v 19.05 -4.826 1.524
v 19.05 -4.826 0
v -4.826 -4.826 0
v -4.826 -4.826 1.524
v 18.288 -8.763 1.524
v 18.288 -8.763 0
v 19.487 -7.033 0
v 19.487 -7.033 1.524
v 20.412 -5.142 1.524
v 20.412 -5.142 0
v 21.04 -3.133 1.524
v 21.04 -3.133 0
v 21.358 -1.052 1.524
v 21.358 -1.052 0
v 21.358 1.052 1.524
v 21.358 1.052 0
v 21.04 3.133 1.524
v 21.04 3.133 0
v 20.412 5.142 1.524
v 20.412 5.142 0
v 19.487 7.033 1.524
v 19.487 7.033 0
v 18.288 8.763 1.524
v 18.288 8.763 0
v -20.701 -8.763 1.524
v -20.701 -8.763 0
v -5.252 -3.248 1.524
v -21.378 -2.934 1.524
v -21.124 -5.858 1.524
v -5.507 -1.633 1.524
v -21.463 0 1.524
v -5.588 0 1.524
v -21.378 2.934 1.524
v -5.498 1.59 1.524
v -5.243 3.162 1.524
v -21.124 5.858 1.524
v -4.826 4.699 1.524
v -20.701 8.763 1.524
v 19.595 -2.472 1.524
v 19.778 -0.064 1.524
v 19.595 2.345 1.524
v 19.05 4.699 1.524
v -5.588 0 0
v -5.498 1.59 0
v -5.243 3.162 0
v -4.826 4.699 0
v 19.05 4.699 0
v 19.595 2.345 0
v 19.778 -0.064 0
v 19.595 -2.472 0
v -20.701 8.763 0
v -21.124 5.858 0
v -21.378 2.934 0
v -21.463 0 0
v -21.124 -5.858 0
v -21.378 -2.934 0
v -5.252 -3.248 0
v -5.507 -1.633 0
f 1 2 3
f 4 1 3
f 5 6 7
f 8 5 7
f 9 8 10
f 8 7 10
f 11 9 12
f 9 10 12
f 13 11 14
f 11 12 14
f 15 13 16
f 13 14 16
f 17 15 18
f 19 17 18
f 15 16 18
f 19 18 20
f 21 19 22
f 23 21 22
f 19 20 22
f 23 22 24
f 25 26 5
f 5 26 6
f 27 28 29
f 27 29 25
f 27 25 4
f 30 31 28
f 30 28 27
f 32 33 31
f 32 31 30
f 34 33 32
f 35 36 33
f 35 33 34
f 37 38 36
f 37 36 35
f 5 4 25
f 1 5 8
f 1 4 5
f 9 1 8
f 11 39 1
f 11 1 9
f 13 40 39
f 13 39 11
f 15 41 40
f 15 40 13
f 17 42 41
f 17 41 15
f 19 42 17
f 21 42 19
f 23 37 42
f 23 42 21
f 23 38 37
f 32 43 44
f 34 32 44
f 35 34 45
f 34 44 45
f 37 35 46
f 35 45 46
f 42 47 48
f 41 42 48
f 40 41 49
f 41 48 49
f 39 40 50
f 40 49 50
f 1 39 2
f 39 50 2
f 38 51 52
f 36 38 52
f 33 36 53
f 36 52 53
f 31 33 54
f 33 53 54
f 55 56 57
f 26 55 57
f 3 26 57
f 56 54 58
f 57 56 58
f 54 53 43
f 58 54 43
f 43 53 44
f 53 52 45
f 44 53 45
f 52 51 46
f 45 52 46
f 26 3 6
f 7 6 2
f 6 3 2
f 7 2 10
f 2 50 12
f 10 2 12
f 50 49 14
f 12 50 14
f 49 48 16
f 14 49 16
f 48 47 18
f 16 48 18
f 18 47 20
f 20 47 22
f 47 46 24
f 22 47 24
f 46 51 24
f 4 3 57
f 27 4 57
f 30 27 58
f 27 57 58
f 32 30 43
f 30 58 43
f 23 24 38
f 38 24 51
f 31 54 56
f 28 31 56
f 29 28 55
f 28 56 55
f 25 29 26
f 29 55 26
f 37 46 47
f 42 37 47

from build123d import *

# Parameters (mm, degrees)
F1_DEPTH = 1.524


with BuildPart() as f1:
    # F0 (on Top) → F1 (new body)
    with BuildSketch(Plane.XY):
        with BuildLine():
            ThreePointArc((18.288, -8.763), (21.397902, 0), (18.288, 8.763))
            Line((18.288, 8.763), (-20.701, 8.763))
            ThreePointArc((-20.701, 8.763), (-21.272141, 4.398034), (-21.463, 0))
            ThreePointArc((-21.463, 0), (-21.272141, -4.398034), (-20.701, -8.763))
            Line((-20.701, -8.763), (18.288, -8.763))
        make_face()
        with BuildLine():
            ThreePointArc((-4.826, -4.826), (-5.401379, -2.443691), (-5.588, 0))
            ThreePointArc((-5.588, 0), (-5.391345, 2.379394), (-4.826, 4.699))
            Line((-4.826, 4.699), (19.05, 4.699))
            ThreePointArc((19.05, 4.699), (19.777522, -0.0635), (19.05, -4.826))
            Line((19.05, -4.826), (-4.826, -4.826))
        make_face(mode=Mode.SUBTRACT)
    extrude(amount=F1_DEPTH)


solid = f1.part
